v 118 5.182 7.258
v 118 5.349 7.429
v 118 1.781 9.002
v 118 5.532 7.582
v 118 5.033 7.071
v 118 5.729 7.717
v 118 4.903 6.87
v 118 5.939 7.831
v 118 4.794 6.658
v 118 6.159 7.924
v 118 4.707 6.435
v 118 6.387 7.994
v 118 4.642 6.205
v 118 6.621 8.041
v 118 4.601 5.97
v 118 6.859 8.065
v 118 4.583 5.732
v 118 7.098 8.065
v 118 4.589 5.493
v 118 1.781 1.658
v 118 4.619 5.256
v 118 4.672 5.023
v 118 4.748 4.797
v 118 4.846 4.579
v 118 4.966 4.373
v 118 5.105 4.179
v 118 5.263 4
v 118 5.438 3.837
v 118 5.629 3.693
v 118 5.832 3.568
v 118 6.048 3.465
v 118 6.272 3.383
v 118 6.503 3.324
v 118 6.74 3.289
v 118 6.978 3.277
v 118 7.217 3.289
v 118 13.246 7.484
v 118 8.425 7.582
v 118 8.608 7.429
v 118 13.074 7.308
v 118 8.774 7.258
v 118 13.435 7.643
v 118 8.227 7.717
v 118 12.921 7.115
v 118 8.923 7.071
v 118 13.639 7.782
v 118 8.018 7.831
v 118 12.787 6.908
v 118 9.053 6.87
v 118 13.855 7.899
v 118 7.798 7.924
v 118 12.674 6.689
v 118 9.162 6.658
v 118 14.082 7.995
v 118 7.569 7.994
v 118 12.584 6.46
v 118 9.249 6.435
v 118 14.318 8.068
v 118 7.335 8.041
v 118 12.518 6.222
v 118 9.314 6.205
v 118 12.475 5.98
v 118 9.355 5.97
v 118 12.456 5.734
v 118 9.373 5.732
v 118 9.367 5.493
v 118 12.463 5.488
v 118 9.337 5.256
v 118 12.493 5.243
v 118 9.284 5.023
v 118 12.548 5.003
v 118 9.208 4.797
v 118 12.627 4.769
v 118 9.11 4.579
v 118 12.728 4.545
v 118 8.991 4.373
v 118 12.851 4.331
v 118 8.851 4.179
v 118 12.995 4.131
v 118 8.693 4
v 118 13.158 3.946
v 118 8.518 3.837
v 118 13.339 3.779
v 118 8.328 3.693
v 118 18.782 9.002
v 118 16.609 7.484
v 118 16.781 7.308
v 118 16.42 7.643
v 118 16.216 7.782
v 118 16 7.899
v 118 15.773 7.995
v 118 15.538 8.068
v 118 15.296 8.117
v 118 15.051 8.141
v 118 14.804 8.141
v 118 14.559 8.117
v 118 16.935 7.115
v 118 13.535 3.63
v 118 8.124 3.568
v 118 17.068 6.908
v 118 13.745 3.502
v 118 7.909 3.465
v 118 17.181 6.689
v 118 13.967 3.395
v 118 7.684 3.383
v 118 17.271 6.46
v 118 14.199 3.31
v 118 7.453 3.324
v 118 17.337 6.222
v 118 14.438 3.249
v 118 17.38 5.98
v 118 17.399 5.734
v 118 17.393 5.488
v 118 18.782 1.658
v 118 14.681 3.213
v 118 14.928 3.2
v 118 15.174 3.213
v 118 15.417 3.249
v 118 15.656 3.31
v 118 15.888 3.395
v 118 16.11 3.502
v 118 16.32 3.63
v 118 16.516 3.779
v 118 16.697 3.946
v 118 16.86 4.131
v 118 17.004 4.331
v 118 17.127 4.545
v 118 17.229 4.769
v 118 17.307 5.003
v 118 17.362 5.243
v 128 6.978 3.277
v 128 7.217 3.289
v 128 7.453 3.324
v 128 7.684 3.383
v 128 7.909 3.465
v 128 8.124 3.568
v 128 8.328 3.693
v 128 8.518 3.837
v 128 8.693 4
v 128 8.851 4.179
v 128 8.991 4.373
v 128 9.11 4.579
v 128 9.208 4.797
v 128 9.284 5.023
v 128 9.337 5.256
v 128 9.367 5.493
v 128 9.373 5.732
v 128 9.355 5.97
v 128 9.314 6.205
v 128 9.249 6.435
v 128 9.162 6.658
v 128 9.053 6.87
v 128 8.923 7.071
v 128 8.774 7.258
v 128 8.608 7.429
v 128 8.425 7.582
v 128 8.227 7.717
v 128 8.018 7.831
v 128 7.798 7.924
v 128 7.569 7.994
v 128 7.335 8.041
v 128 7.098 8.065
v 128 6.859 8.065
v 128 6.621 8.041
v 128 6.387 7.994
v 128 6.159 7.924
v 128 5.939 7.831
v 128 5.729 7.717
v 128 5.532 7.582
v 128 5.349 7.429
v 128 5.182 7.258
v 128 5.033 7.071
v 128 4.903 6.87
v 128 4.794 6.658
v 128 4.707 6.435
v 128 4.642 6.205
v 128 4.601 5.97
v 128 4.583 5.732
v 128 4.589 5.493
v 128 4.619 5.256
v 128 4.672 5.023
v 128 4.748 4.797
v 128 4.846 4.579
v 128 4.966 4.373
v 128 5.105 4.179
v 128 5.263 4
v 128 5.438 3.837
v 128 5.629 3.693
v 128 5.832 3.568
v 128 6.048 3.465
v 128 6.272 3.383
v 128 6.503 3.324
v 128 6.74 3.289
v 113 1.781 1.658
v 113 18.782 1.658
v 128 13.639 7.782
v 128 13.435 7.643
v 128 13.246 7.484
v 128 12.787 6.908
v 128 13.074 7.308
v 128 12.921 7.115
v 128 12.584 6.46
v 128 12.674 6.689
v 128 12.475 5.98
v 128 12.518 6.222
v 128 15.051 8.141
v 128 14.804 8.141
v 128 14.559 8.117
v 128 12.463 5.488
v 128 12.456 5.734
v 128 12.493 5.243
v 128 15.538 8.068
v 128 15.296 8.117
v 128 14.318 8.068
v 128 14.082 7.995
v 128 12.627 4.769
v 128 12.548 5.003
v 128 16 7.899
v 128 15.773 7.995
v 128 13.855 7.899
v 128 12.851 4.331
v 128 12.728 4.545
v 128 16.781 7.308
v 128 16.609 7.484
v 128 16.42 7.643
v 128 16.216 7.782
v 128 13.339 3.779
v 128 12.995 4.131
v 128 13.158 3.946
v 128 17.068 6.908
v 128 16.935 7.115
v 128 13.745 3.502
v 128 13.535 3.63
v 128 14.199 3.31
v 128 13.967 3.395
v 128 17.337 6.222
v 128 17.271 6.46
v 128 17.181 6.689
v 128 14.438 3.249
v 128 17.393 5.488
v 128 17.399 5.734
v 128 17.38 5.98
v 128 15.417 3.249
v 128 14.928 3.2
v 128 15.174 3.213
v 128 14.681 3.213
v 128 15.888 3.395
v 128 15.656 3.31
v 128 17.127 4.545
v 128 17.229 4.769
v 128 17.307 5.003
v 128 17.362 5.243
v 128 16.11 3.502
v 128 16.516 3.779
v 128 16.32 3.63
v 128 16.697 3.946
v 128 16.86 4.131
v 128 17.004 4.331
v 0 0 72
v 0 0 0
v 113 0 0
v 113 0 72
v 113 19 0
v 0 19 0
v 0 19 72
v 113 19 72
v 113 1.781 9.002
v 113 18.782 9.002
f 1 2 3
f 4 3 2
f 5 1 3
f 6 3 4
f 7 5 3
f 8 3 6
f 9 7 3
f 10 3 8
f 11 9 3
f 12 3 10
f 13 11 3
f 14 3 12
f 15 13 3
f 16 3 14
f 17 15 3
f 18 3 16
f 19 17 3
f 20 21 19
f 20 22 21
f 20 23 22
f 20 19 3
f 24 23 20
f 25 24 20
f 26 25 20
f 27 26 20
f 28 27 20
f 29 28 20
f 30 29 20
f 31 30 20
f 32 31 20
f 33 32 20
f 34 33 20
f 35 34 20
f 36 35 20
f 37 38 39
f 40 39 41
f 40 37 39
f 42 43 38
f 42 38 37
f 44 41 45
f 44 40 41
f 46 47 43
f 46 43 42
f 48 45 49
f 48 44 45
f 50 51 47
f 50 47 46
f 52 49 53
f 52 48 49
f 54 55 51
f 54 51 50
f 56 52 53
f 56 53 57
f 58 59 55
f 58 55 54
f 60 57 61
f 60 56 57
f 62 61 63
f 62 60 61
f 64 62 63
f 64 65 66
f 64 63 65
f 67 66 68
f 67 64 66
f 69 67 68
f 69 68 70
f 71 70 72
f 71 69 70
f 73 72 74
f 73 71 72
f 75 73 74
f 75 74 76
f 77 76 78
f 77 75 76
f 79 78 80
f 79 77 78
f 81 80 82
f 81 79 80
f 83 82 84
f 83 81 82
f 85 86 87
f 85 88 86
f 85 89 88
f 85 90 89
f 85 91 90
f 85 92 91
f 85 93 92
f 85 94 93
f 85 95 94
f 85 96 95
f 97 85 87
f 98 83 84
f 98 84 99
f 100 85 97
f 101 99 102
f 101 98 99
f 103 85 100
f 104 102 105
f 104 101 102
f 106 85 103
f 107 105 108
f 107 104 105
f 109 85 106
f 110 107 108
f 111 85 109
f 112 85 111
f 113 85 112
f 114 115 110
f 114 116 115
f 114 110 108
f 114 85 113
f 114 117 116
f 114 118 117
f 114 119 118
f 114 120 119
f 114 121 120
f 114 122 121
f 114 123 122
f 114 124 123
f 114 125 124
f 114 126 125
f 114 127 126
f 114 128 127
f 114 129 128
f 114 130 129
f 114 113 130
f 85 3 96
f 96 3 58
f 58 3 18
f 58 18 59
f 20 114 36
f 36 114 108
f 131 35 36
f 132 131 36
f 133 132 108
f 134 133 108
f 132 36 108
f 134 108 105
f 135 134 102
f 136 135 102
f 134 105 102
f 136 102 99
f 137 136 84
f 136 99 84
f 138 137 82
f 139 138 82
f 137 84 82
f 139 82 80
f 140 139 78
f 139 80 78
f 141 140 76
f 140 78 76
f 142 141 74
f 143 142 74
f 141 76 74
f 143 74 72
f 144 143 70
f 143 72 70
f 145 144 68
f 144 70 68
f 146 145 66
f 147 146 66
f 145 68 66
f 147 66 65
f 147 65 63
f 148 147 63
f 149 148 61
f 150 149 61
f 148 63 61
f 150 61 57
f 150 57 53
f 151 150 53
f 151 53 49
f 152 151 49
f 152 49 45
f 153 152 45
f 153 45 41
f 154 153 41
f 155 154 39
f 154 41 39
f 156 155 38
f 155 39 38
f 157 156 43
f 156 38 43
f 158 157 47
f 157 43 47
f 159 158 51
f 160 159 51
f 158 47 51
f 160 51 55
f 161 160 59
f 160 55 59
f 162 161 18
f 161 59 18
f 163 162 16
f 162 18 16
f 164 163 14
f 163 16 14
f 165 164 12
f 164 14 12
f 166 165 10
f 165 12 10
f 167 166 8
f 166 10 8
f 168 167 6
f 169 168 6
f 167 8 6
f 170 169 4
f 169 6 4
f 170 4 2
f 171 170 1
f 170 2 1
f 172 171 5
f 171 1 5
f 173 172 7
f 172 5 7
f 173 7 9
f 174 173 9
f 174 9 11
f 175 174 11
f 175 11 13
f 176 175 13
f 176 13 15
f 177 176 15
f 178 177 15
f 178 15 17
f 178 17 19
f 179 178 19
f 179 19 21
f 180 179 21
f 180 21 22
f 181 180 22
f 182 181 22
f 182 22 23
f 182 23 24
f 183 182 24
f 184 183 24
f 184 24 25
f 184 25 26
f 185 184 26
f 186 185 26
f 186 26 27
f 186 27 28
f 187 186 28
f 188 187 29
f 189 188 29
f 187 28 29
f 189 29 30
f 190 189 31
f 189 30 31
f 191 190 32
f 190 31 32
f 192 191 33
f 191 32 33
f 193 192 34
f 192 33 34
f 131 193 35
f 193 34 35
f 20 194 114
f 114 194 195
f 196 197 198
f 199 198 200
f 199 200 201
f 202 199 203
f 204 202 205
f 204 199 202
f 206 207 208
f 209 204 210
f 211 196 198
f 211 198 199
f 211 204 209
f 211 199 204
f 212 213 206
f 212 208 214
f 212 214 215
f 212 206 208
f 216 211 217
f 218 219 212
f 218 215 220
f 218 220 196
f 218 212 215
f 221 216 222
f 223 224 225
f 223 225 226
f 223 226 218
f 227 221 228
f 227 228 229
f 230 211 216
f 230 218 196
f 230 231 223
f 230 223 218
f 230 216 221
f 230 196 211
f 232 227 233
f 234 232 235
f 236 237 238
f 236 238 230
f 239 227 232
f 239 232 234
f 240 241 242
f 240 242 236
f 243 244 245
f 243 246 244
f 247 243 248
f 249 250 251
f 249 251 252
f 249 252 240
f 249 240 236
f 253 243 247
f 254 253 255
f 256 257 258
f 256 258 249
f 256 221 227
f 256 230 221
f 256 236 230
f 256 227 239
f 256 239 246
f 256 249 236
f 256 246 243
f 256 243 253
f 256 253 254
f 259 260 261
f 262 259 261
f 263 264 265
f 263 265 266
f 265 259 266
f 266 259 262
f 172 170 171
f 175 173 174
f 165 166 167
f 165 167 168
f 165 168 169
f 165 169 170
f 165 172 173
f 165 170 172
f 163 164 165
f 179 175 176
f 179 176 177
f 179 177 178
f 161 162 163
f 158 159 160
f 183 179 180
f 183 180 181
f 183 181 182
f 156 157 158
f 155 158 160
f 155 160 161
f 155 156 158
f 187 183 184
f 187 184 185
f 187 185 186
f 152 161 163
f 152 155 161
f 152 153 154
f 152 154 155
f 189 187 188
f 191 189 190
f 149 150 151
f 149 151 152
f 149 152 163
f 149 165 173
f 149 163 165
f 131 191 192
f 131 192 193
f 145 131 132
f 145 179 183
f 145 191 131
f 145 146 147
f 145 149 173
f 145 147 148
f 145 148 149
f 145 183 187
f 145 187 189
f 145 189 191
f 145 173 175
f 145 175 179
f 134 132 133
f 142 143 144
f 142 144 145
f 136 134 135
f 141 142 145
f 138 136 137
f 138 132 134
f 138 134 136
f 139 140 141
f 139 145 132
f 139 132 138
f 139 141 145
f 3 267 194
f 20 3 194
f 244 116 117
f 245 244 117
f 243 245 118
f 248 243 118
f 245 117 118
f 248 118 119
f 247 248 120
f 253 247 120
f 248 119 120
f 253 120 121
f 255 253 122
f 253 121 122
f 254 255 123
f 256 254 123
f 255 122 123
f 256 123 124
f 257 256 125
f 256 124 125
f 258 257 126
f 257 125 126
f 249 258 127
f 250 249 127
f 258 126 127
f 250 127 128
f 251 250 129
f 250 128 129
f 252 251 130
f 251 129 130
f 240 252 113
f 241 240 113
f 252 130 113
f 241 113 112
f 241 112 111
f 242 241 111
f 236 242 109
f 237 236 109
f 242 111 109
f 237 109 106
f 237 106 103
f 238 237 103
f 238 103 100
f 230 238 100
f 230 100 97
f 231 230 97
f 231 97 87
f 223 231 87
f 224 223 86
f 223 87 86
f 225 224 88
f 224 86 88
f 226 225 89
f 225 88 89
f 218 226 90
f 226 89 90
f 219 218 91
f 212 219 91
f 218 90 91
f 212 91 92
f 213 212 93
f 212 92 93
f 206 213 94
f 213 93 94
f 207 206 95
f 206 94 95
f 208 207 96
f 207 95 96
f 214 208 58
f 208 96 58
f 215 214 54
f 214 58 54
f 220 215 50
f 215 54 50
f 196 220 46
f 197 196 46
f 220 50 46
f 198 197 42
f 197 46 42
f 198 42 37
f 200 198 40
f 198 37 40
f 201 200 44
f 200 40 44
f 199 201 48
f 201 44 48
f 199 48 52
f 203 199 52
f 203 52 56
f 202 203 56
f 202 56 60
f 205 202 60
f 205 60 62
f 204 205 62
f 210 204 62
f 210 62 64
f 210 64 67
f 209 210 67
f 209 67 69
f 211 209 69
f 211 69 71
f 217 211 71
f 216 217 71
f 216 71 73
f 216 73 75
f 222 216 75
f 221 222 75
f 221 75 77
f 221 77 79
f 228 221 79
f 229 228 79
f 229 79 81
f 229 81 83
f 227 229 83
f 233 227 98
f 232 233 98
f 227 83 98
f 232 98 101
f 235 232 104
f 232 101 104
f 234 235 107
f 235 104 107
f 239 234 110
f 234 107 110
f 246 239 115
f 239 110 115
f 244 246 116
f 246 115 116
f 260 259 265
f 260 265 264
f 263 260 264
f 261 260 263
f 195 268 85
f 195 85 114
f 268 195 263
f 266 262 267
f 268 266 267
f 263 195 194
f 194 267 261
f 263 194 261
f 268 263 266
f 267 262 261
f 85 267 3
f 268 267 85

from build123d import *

# Parameters (mm, degrees)
SKETCH_1_W      = 113
SKETCH_1_H      = 72
EXTRUDE_1_DEPTH = 19
SKETCH_2_W      = 7.344019186
SKETCH_2_H      = 17.001907431
EXTRUDE_2_DEPTH = 5
SKETCH_3_R      = 2.471853224
SKETCH_3_R_2    = 2.395721662
EXTRUDE_3_DEPTH = 10


with BuildPart() as part:
    # 草图1 → 凸台-拉伸1 (new body)
    with BuildSketch(Plane(origin=(0, 0, 0), x_dir=(1, 0, 0), z_dir=(0, 1, 0))):
        with Locations((56.5, -36)):
            Rectangle(SKETCH_1_W, SKETCH_1_H)
    extrude(amount=EXTRUDE_1_DEPTH)

    # 草图2 → 凸台-拉伸2 (add)
    with BuildSketch(Plane(origin=(113, 0, 0), x_dir=(0, 0, -1), z_dir=(1, 0, 0))):
        with Locations((-5.329755024, 10.281536394)):
            Rectangle(SKETCH_2_W, SKETCH_2_H)
    extrude(amount=EXTRUDE_2_DEPTH)

    # 草图3 → 凸台-拉伸3 (add)
    with BuildSketch(Plane(origin=(118, 0, 0), x_dir=(0, 0, -1), z_dir=(1, 0, 0))):
        with Locations((-5.672341685, 14.927563873)):
            Circle(SKETCH_3_R)
        with Locations((-5.672341685, 6.978123812)):
            Circle(SKETCH_3_R_2)
    extrude(amount=EXTRUDE_3_DEPTH)


solid = part.part
